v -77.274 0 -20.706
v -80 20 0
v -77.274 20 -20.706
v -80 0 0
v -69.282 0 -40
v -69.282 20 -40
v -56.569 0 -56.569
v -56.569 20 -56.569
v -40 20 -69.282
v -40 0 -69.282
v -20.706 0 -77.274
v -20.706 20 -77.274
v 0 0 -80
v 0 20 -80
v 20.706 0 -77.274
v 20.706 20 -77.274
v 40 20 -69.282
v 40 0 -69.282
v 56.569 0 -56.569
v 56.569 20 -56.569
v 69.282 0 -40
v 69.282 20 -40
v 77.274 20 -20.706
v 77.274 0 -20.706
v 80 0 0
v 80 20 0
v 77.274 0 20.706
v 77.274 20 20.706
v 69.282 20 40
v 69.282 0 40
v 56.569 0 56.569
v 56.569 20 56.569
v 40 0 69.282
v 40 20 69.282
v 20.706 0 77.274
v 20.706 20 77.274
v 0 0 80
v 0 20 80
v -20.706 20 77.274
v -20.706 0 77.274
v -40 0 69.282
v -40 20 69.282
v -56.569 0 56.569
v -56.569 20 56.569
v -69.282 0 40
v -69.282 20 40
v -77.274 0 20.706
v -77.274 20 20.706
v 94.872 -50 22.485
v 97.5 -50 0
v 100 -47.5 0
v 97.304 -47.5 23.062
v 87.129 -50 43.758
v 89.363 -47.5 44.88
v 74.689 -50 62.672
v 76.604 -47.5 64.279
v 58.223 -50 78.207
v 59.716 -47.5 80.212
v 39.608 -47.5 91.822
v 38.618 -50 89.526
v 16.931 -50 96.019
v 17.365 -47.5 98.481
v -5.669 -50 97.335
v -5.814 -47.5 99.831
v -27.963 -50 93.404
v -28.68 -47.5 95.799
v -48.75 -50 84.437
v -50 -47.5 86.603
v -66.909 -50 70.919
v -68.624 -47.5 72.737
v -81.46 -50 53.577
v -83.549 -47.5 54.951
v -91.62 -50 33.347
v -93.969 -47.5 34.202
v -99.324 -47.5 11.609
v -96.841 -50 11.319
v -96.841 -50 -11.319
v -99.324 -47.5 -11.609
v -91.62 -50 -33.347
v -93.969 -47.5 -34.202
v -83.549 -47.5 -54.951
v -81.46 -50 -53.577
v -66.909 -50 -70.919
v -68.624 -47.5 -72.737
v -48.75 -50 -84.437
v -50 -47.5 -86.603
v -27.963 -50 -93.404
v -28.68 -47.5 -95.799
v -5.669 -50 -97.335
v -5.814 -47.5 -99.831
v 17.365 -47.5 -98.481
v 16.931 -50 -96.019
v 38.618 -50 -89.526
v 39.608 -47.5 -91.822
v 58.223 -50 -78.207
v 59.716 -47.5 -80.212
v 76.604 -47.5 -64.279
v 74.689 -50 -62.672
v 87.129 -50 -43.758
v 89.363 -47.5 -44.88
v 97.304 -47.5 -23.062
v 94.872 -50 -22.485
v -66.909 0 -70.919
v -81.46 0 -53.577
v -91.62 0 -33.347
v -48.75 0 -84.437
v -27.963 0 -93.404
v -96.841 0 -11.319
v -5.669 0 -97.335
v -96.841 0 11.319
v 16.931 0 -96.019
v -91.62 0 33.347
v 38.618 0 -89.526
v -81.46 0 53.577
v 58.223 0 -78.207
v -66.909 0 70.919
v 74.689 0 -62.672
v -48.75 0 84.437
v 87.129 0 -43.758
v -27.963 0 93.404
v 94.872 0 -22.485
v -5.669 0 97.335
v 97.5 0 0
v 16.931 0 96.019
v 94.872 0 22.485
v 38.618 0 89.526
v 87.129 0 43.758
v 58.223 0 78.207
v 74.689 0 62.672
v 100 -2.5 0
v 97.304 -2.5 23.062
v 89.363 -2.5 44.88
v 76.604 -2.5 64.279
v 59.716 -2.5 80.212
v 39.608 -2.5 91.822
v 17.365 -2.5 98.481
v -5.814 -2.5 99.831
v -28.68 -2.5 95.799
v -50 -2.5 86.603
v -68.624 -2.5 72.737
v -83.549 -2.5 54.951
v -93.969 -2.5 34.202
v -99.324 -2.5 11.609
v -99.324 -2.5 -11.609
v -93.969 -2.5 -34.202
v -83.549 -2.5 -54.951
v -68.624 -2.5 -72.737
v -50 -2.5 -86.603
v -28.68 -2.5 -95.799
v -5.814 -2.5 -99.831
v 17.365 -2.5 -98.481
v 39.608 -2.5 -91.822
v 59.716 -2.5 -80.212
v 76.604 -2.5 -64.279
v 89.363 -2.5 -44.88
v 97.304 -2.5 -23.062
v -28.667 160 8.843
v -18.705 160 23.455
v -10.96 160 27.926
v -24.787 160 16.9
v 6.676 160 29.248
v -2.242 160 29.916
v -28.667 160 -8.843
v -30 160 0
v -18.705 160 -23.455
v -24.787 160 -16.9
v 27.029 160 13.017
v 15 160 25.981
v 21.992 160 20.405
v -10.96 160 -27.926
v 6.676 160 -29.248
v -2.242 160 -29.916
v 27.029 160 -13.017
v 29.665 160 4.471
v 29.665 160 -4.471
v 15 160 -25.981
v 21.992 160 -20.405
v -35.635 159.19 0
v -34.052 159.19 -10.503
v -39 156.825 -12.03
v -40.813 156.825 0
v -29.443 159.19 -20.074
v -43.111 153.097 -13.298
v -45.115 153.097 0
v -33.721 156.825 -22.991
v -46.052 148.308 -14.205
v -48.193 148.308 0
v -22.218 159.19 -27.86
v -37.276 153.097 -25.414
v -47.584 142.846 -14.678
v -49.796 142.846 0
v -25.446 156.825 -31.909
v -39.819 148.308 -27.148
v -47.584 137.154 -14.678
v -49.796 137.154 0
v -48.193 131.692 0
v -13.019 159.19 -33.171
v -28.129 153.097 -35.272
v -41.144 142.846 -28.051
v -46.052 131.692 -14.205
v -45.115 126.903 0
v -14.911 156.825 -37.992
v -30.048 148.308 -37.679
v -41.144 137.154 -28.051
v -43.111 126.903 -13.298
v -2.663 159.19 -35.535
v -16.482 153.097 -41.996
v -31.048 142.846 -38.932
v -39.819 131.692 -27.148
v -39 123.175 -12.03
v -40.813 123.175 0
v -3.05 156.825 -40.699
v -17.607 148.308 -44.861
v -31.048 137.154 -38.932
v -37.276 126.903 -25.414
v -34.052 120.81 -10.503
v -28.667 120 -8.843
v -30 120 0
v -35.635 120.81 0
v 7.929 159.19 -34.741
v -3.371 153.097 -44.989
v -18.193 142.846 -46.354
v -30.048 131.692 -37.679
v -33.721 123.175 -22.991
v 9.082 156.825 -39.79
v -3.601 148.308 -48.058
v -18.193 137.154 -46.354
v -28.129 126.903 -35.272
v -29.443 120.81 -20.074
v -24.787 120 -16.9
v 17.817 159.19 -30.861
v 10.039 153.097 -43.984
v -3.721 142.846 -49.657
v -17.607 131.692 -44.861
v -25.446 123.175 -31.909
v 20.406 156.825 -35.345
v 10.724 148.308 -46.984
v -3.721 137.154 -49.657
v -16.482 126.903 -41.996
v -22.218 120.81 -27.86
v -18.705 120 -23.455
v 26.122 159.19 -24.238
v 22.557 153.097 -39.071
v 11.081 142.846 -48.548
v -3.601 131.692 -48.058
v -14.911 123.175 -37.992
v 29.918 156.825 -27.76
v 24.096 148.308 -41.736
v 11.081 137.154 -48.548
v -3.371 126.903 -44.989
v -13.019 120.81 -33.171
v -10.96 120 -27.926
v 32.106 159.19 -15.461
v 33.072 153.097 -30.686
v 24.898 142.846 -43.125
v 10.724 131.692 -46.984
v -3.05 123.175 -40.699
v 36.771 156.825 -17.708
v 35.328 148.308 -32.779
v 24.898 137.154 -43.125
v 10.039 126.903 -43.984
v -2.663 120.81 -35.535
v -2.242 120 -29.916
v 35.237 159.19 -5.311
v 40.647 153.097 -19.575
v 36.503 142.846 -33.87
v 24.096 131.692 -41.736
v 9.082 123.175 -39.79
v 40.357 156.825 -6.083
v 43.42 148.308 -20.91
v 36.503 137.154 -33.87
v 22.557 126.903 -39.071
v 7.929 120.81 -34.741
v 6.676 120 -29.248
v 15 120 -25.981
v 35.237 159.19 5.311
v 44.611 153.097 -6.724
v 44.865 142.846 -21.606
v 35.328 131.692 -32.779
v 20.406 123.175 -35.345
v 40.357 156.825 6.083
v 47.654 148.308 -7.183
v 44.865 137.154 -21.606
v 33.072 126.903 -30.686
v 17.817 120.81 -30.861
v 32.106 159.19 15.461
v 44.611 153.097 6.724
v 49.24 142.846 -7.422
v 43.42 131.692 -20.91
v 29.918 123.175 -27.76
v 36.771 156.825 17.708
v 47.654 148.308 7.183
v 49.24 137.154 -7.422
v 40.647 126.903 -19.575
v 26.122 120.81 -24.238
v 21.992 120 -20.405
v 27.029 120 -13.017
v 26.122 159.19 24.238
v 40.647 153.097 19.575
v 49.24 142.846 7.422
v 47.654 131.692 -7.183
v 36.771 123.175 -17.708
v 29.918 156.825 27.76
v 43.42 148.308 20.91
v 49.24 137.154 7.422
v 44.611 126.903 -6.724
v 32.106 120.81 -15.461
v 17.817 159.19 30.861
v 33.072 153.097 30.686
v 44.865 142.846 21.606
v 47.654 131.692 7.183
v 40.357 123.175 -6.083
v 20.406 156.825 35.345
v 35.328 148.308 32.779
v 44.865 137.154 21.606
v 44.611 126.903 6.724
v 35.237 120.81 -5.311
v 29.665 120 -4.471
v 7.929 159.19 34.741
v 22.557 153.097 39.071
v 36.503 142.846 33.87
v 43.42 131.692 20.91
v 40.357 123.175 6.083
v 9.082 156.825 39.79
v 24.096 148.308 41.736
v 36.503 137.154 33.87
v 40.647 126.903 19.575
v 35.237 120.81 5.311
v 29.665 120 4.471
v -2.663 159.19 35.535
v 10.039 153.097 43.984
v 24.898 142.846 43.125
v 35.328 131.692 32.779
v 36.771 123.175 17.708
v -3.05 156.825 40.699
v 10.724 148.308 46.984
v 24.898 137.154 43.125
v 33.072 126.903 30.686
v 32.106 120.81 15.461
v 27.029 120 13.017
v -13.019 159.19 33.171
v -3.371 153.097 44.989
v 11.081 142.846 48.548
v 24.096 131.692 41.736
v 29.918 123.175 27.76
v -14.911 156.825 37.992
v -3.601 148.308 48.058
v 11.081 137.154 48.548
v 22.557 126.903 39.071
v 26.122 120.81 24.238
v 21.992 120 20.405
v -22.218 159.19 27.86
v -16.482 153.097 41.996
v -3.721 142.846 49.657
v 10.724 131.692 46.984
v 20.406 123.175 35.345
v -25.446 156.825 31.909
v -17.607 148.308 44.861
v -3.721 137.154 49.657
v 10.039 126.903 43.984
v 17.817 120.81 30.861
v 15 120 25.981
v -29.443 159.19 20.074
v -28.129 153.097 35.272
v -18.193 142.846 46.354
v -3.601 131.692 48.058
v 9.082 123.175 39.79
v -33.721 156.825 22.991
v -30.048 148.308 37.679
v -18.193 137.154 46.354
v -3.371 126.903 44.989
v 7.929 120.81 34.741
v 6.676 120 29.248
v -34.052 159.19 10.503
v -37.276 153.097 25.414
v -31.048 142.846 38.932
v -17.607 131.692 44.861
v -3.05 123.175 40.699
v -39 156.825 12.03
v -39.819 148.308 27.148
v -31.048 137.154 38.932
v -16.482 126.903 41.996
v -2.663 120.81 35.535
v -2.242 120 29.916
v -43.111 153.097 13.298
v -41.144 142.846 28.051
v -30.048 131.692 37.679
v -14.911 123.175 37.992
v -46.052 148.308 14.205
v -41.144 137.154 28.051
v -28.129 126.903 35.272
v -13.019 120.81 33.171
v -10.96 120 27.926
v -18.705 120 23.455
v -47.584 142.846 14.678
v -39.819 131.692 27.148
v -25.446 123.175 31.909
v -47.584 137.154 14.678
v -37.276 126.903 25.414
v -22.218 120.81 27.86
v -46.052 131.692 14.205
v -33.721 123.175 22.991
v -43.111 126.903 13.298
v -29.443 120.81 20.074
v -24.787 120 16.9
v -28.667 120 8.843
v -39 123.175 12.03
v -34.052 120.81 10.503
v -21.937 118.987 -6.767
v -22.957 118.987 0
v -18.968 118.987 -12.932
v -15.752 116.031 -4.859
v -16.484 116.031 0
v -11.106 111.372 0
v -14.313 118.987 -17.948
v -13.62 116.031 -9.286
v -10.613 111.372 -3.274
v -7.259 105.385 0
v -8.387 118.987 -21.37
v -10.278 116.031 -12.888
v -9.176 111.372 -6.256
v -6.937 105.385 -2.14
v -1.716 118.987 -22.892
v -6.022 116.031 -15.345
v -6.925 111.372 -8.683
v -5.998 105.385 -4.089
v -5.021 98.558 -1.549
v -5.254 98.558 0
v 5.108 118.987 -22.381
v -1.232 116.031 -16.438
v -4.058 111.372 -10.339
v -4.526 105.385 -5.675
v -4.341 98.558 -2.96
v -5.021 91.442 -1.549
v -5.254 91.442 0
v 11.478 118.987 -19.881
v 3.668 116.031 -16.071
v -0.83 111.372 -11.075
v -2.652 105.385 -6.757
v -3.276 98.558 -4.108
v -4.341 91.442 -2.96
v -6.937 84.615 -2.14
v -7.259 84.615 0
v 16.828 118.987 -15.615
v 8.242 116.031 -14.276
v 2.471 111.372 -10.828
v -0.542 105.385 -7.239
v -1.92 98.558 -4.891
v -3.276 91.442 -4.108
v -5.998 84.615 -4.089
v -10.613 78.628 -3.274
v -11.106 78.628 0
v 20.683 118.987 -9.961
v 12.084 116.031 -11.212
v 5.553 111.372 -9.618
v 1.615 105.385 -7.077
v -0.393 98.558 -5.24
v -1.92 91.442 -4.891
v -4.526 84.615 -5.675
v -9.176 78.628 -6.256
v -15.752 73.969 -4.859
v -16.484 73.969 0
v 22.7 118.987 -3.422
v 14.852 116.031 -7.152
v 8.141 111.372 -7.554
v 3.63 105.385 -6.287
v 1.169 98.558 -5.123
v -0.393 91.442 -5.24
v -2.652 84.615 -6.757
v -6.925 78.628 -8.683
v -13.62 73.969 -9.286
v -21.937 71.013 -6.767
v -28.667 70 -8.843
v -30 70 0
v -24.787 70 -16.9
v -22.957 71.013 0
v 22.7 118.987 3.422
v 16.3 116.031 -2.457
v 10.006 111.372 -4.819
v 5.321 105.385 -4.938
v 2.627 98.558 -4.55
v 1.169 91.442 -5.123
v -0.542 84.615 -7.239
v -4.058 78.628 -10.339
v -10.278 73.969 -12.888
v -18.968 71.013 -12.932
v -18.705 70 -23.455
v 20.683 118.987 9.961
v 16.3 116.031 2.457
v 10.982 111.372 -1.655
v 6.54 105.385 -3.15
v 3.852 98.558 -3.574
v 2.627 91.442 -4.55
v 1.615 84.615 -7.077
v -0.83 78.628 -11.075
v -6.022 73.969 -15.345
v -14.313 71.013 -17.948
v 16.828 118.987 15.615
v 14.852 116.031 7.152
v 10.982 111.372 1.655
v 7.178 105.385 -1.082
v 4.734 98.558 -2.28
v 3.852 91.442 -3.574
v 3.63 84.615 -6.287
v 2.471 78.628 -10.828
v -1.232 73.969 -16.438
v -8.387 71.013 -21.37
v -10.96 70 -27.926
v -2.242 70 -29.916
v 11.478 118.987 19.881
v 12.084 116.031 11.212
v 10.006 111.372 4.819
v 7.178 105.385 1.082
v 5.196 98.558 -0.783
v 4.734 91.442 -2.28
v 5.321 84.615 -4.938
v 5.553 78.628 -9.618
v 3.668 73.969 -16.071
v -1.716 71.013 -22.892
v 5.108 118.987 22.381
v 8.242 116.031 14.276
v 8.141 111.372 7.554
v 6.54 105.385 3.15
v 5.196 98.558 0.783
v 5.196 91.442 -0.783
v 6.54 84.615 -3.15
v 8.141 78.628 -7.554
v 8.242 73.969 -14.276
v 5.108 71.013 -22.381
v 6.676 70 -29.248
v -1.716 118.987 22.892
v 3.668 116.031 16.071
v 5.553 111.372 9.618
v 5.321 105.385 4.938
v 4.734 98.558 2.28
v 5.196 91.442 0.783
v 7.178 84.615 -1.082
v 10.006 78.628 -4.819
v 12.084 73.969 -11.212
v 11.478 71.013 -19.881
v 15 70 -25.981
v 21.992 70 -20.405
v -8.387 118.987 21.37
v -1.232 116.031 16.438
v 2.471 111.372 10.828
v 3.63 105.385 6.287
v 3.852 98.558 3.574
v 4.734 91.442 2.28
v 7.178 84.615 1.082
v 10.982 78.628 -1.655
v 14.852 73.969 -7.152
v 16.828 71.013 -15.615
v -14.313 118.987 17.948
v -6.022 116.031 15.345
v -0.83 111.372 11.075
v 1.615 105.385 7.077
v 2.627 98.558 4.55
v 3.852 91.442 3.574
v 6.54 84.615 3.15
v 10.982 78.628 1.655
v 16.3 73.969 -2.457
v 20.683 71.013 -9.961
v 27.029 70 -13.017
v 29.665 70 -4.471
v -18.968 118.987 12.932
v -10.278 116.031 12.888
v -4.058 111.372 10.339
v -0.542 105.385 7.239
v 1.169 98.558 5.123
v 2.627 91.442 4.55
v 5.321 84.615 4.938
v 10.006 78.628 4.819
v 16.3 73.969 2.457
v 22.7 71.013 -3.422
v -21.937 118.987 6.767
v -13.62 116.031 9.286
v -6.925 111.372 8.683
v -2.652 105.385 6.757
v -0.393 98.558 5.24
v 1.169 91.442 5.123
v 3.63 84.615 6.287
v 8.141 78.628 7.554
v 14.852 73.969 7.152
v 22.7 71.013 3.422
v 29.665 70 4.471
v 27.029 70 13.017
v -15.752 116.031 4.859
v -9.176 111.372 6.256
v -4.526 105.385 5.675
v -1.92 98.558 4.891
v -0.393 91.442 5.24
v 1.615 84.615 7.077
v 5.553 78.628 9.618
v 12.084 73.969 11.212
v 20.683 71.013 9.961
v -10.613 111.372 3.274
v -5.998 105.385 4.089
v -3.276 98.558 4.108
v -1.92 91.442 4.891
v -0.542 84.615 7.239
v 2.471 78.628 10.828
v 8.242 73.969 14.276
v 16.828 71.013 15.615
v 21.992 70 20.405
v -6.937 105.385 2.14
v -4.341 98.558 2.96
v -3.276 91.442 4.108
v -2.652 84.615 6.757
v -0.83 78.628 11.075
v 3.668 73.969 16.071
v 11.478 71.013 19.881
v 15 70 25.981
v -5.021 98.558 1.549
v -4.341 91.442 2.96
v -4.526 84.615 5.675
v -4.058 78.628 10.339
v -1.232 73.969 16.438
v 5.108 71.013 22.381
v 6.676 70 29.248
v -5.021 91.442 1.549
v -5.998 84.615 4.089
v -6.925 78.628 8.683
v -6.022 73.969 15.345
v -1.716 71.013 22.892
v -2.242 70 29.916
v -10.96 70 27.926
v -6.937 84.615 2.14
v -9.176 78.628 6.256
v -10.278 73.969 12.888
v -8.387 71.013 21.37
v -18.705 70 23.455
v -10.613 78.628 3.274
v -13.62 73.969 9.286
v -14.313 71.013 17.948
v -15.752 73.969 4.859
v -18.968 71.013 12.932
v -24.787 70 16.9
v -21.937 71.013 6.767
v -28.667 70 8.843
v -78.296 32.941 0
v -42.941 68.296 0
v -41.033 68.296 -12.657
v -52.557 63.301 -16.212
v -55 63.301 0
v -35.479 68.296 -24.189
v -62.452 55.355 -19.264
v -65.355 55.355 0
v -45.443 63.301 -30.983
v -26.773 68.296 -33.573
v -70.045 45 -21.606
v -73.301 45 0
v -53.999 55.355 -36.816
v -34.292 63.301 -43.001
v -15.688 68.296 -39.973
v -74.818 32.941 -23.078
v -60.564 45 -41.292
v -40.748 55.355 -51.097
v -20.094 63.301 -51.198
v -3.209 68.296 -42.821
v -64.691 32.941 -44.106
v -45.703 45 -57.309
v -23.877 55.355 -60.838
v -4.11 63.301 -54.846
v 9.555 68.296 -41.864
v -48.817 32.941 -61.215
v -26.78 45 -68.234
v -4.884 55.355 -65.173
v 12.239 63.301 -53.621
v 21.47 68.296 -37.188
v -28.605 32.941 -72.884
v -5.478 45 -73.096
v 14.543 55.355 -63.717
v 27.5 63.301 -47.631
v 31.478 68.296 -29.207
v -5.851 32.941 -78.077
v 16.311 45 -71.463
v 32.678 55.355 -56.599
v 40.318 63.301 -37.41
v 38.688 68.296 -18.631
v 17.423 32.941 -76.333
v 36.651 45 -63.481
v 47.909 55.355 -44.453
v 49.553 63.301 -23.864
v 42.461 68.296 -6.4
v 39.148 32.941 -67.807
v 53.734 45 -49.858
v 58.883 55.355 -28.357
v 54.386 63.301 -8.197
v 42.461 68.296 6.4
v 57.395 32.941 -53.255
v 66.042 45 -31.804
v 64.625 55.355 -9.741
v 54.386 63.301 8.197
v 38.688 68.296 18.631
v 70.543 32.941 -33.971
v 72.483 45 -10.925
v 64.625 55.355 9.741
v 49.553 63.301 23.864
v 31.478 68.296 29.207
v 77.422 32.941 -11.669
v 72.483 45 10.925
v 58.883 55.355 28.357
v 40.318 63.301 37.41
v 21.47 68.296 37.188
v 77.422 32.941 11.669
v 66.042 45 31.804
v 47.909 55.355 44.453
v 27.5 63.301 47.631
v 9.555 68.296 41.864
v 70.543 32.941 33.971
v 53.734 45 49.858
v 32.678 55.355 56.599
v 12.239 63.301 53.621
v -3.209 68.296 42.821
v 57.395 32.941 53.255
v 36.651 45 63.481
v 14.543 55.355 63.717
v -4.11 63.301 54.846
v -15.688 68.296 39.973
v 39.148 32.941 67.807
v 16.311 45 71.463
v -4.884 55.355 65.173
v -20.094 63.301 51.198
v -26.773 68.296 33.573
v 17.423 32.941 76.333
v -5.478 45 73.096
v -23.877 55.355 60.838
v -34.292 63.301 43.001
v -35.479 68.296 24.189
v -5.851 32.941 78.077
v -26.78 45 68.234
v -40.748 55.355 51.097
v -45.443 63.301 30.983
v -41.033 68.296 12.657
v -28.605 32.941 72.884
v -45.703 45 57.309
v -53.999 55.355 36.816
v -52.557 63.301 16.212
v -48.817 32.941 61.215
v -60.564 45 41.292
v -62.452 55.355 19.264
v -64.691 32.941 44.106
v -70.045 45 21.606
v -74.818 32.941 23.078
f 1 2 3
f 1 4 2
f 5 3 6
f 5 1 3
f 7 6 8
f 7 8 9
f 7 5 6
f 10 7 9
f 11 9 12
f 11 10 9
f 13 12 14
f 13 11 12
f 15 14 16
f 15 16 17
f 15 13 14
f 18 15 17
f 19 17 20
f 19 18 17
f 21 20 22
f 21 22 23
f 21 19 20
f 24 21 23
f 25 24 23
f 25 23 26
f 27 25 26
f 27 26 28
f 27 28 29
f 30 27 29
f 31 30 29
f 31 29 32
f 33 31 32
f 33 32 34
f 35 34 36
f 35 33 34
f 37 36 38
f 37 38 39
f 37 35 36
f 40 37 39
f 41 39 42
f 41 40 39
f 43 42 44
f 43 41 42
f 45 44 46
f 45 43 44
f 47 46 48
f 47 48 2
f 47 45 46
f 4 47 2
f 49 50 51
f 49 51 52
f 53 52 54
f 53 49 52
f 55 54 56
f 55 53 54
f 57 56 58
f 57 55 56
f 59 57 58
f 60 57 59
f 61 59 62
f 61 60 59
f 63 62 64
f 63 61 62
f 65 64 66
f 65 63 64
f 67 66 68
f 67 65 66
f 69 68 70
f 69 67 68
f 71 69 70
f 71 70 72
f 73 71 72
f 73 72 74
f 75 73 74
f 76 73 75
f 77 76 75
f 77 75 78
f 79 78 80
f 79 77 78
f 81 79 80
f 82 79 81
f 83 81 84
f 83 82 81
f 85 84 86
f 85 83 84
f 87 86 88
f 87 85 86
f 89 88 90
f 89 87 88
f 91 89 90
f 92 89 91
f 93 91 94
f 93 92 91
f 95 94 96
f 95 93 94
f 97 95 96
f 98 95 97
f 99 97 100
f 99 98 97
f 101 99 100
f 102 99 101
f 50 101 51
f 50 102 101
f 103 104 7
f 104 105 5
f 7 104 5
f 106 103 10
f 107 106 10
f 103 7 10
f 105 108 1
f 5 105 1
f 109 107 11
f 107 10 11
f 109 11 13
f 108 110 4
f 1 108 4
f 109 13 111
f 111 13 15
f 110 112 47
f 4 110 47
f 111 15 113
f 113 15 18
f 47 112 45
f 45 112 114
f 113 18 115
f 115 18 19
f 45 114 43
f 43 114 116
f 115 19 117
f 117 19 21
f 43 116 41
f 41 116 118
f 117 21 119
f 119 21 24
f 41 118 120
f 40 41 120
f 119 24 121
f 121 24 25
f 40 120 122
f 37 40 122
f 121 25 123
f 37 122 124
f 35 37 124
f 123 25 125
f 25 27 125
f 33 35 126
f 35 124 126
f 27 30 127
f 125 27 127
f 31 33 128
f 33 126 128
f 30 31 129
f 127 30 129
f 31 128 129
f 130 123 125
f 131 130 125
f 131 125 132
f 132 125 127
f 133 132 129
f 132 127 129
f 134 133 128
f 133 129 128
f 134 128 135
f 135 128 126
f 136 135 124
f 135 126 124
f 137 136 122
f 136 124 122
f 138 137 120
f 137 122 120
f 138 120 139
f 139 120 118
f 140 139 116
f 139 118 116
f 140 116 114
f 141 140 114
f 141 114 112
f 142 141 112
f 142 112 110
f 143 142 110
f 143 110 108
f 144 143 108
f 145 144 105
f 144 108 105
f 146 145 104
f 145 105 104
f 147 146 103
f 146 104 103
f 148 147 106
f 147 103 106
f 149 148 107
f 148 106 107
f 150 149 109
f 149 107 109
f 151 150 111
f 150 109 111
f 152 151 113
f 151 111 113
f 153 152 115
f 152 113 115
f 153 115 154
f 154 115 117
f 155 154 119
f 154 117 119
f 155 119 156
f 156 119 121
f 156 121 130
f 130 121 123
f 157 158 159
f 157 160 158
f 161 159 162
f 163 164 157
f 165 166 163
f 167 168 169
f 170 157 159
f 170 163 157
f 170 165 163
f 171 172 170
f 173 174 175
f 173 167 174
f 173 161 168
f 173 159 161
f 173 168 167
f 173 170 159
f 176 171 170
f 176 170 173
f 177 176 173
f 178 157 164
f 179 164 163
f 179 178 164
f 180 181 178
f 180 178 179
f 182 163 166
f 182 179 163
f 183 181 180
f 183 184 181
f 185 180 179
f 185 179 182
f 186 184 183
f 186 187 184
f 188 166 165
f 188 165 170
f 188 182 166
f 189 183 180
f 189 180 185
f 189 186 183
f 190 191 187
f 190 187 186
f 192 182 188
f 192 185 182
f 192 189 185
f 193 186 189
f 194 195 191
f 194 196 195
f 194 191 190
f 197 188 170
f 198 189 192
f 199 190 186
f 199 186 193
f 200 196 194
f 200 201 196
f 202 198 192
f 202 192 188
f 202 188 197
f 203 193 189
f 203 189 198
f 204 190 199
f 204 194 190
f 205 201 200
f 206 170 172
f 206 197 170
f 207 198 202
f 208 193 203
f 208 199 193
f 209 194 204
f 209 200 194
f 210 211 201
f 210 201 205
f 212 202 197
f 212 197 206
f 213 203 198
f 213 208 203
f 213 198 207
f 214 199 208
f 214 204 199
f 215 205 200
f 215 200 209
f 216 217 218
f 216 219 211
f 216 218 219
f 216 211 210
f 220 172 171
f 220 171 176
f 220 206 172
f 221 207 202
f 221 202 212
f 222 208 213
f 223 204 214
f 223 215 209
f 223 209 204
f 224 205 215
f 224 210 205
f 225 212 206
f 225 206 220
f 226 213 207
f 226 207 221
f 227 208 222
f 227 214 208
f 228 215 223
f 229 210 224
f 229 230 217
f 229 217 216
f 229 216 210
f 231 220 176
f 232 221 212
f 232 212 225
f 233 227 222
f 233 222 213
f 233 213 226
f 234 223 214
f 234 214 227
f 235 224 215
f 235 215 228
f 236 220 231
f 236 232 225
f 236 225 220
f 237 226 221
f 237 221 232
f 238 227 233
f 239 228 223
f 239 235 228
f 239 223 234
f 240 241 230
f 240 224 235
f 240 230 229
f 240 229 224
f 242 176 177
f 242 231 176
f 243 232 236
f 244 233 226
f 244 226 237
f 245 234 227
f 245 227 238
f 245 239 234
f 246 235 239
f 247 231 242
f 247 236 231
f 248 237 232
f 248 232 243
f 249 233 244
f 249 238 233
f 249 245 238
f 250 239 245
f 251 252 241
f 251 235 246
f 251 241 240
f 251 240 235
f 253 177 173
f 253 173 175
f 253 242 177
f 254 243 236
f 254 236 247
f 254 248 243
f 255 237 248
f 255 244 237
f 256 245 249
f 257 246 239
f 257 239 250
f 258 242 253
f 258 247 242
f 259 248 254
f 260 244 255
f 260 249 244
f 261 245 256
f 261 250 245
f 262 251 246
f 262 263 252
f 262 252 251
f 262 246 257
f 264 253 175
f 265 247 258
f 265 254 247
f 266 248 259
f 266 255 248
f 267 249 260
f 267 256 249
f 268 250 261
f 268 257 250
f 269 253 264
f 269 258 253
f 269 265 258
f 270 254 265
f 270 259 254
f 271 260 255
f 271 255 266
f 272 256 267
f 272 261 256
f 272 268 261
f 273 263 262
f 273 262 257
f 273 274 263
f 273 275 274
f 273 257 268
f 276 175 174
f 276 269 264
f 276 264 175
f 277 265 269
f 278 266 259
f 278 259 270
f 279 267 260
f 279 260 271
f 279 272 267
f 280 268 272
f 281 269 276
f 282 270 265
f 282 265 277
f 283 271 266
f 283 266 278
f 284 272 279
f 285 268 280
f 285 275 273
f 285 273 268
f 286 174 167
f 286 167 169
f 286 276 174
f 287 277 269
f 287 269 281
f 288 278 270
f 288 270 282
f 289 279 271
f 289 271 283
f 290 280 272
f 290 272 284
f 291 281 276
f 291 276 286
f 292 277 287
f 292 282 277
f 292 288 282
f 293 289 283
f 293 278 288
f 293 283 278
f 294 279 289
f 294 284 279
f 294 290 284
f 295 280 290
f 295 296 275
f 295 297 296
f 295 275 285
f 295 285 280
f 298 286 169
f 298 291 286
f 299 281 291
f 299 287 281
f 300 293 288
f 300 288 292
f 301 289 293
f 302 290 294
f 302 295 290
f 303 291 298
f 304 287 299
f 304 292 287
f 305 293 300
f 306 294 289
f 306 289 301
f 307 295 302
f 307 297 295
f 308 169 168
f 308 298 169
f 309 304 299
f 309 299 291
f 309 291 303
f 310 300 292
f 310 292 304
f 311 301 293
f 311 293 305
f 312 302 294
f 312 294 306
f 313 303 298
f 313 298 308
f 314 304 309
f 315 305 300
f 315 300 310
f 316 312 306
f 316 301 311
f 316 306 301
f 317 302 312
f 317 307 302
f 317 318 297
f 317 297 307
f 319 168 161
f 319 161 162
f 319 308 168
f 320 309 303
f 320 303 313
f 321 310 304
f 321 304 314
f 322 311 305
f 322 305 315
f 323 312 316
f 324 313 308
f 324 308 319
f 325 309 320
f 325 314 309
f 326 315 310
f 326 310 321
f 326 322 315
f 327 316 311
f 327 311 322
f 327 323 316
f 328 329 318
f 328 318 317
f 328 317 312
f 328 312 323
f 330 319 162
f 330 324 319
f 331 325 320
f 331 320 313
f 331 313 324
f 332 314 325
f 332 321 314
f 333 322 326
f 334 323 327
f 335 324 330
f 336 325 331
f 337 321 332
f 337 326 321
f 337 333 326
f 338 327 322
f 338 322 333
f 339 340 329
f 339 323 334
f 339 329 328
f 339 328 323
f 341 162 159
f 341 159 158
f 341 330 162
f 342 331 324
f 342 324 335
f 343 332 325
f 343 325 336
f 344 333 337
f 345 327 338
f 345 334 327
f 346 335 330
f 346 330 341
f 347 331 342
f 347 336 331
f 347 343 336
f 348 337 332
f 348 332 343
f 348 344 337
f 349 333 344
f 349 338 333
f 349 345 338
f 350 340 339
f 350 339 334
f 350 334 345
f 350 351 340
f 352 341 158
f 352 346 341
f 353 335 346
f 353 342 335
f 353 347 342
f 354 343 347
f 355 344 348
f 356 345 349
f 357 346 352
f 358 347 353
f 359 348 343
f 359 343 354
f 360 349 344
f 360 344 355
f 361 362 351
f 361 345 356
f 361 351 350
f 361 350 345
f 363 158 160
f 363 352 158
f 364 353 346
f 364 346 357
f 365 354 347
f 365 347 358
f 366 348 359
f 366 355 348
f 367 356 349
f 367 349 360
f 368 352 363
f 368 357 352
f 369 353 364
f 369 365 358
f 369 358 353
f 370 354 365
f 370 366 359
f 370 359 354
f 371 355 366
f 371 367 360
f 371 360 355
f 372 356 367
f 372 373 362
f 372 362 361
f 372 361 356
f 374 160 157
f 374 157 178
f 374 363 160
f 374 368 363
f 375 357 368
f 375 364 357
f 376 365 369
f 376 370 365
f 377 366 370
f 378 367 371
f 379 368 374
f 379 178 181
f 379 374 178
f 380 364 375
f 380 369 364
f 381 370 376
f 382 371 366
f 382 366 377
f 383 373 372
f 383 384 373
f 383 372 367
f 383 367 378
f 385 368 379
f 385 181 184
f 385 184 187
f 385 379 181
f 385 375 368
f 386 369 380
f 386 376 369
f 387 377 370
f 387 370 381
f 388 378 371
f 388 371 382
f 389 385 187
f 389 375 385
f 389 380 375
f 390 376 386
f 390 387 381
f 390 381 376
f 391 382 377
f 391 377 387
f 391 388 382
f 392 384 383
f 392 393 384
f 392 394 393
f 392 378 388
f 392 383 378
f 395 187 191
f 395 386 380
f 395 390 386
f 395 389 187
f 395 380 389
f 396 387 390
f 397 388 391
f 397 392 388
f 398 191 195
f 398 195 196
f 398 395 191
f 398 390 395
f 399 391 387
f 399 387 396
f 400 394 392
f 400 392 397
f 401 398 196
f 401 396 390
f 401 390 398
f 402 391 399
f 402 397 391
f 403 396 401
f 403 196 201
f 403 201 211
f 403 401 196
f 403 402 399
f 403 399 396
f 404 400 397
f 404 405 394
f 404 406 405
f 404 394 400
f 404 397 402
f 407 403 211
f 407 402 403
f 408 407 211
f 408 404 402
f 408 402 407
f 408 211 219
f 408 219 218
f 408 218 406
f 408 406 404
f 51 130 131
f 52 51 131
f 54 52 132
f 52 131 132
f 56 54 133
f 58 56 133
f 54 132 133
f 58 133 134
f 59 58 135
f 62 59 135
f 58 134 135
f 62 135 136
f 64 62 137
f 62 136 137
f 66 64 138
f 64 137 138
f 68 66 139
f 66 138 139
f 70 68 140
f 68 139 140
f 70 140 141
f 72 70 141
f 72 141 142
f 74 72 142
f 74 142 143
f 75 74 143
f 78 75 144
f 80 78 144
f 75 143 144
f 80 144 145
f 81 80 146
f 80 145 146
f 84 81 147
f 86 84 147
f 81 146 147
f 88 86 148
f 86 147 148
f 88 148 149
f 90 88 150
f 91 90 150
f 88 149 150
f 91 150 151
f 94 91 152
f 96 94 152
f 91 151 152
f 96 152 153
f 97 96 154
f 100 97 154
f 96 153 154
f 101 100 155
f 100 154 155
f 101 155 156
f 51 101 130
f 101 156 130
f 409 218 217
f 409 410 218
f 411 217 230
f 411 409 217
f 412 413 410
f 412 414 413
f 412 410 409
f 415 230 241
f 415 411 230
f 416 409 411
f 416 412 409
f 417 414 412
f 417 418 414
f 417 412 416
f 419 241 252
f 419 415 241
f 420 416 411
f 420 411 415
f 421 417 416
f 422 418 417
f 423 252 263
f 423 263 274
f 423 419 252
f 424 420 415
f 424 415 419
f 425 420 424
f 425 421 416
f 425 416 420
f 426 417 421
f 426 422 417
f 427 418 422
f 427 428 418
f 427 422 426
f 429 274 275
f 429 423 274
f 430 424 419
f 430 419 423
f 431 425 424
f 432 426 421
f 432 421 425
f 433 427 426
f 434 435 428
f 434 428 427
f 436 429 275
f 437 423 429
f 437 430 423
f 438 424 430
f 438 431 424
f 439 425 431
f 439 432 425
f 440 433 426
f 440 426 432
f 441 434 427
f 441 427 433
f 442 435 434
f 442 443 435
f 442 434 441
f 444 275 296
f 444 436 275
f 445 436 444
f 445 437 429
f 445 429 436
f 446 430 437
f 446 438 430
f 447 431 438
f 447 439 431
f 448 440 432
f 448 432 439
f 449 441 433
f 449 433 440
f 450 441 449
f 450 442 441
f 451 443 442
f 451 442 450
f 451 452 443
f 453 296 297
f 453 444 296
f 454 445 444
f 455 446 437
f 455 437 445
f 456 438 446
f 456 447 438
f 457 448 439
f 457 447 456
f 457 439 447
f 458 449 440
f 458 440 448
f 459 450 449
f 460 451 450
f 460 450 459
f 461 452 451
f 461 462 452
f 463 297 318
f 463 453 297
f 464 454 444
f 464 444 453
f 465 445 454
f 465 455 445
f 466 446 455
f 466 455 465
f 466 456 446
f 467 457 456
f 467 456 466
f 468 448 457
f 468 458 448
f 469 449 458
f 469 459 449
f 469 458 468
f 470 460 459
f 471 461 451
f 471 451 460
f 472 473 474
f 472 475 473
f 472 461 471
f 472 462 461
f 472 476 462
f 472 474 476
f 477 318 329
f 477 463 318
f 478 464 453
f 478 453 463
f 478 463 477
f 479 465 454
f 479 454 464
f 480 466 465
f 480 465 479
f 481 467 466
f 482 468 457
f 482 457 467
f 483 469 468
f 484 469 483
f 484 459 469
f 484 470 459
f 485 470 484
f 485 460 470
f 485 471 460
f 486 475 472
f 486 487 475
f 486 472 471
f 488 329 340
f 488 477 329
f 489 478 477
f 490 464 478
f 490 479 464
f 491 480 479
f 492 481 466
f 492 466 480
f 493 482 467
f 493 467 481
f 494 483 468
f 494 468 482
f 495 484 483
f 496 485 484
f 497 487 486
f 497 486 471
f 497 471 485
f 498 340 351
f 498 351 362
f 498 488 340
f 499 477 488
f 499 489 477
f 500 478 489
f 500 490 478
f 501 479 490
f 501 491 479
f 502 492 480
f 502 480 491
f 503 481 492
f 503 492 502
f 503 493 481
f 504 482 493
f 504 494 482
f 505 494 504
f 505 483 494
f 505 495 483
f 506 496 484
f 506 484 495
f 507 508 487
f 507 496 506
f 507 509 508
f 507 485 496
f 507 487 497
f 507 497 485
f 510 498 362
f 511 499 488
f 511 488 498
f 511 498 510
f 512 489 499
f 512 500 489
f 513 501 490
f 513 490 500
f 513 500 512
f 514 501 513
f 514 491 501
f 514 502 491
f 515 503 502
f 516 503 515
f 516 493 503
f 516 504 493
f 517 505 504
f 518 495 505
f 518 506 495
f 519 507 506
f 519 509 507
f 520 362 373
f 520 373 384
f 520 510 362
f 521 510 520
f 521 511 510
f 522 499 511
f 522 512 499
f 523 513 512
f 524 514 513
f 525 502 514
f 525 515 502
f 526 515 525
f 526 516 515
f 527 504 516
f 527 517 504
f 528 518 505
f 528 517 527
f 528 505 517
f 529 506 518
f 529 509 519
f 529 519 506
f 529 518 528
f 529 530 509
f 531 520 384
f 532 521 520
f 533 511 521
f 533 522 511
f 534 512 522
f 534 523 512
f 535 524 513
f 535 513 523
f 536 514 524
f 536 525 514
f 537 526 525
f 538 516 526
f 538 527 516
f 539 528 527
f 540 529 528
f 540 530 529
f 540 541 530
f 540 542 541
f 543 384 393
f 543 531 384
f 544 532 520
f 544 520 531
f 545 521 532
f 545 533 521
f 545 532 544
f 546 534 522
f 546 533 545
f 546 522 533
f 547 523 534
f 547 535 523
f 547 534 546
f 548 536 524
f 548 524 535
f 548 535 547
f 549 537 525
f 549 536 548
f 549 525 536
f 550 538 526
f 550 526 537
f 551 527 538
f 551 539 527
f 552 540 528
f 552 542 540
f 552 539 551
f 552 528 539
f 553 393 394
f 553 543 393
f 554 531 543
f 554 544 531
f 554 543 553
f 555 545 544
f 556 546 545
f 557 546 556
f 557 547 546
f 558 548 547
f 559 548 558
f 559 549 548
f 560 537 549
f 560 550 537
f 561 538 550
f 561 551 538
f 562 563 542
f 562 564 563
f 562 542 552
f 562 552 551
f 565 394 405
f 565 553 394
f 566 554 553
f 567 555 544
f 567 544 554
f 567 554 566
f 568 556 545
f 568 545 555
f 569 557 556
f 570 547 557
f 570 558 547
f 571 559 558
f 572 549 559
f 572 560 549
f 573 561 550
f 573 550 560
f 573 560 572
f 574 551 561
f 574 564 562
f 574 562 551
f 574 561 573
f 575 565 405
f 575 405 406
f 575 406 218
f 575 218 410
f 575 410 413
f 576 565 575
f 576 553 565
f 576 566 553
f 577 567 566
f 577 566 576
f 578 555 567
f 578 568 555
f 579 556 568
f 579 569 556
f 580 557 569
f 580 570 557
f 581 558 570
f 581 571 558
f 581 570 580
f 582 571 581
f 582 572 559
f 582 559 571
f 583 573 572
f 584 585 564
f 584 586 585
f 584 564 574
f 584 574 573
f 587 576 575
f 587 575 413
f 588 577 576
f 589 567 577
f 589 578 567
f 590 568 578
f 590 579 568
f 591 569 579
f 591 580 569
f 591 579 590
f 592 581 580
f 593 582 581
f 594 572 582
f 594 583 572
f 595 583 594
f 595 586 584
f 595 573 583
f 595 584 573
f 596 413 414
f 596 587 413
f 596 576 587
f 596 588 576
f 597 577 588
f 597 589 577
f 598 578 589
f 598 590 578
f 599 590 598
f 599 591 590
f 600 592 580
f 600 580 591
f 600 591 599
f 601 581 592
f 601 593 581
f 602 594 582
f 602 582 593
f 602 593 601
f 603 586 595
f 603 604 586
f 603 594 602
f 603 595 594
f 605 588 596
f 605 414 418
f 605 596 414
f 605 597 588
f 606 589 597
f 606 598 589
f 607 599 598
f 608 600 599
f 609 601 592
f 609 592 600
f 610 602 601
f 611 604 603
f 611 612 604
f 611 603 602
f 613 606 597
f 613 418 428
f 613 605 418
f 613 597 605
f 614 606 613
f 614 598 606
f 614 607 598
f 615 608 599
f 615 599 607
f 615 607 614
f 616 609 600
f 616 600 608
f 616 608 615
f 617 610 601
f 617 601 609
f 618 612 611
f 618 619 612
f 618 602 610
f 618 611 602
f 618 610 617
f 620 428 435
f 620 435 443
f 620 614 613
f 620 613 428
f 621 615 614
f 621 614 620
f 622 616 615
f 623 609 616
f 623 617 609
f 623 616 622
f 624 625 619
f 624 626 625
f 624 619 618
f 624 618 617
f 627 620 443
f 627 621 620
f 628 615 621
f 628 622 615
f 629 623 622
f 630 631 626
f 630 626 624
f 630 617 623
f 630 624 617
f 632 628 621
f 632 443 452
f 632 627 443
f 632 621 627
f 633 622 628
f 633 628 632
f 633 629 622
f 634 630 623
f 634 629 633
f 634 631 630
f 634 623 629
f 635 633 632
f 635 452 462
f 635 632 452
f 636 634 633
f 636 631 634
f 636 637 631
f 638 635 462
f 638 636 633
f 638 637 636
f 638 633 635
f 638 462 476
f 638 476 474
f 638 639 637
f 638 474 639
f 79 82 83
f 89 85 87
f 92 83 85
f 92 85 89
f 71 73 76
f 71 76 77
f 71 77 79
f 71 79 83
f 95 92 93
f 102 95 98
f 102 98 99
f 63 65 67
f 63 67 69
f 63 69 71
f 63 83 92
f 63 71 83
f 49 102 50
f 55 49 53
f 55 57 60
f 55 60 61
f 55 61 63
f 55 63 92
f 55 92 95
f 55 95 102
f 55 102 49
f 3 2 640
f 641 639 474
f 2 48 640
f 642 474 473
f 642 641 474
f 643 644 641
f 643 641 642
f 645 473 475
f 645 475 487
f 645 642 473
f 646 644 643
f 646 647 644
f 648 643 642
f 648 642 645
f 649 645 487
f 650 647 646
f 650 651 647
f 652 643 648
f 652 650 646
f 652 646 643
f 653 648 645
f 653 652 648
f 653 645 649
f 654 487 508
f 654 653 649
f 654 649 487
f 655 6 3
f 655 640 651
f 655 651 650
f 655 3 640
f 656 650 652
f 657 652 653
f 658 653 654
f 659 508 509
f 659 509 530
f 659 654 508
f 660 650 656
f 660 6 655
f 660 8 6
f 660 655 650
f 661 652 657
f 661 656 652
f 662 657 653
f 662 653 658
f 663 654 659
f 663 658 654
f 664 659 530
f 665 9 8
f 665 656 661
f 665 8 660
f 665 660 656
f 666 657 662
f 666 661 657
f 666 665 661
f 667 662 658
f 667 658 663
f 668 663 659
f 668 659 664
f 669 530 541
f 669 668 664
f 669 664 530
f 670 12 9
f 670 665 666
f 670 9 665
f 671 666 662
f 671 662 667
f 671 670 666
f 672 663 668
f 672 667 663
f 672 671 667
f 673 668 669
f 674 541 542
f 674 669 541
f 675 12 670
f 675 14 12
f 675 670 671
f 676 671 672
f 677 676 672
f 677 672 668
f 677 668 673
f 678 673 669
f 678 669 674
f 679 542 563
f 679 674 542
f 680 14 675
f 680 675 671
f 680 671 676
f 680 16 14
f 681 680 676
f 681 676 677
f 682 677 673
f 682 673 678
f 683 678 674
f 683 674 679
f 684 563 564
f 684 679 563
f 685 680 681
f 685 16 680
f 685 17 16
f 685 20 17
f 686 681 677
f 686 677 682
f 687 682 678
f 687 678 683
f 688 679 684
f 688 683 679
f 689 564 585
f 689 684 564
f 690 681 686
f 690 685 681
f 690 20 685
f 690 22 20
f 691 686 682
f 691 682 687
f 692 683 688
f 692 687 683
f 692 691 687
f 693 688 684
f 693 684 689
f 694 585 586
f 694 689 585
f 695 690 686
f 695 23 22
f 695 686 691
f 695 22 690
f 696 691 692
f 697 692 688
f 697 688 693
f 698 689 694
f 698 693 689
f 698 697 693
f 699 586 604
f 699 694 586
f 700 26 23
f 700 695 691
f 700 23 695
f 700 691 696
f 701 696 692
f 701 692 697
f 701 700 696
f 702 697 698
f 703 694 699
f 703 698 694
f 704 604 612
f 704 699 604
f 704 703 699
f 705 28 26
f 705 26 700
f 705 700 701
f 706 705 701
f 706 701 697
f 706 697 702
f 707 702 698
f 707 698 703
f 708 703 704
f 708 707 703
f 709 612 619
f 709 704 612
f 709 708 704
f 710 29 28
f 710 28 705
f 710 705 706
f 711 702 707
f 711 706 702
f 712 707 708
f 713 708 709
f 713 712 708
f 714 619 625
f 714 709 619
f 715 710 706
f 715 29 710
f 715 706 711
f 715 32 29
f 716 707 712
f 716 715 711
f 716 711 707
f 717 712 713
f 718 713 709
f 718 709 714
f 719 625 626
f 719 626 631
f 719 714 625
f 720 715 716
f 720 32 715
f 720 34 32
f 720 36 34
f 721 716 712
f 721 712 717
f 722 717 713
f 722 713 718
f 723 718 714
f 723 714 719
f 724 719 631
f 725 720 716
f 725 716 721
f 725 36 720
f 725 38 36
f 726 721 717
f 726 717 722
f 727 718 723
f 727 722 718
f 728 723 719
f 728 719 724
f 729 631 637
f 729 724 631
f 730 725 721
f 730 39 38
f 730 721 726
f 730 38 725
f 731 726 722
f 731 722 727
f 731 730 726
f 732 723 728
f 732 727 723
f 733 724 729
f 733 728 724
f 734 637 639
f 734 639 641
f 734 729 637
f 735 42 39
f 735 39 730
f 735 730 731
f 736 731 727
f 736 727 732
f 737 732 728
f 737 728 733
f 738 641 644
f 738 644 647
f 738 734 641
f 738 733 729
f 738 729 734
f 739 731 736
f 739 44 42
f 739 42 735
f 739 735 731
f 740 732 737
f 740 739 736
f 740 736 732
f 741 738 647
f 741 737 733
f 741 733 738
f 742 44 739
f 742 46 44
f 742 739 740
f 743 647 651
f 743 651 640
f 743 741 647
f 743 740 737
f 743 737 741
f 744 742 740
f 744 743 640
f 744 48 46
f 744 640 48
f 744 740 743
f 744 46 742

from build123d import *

# Parameters (mm, degrees)
ESQUISSE2_R      = 100
EXTRUSION1_DEPTH = 50
CHANFREIN1_SIZE  = 2.5


with BuildPart() as part:
    # Esquisse1 → Révolution2 (revolve)
    with BuildSketch(Plane.XY):
        with BuildLine():
            Line((0, 160), (-30, 160))
            ThreePointArc((-30, 160), (-50, 140), (-30, 120))
            ThreePointArc((-30, 120), (-5, 95), (-30, 70))
            ThreePointArc((-30, 70), (-65.355339059, 55.355339059), (-80, 20))
            Line((-80, 20), (-80, 0))
            Line((-80, 0), (0, 0))
            Line((0, 0), (0, 160))
        make_face()
    revolve(axis=Axis((0, 160, 0), (0, -1, 0)))

    # Esquisse2 → Extrusion1 (add)
    with BuildSketch(Plane.XZ):
        Circle(ESQUISSE2_R)
    extrude(amount=EXTRUSION1_DEPTH)

    # Chanfrein1
    chanfrein1_edges = [part.edges().sort_by_distance(p)[0] for p in [
        (-100, 0, 0),
        (-100, -50, 0),
    ]]
    chamfer(chanfrein1_edges, length=CHANFREIN1_SIZE)


solid = part.part
